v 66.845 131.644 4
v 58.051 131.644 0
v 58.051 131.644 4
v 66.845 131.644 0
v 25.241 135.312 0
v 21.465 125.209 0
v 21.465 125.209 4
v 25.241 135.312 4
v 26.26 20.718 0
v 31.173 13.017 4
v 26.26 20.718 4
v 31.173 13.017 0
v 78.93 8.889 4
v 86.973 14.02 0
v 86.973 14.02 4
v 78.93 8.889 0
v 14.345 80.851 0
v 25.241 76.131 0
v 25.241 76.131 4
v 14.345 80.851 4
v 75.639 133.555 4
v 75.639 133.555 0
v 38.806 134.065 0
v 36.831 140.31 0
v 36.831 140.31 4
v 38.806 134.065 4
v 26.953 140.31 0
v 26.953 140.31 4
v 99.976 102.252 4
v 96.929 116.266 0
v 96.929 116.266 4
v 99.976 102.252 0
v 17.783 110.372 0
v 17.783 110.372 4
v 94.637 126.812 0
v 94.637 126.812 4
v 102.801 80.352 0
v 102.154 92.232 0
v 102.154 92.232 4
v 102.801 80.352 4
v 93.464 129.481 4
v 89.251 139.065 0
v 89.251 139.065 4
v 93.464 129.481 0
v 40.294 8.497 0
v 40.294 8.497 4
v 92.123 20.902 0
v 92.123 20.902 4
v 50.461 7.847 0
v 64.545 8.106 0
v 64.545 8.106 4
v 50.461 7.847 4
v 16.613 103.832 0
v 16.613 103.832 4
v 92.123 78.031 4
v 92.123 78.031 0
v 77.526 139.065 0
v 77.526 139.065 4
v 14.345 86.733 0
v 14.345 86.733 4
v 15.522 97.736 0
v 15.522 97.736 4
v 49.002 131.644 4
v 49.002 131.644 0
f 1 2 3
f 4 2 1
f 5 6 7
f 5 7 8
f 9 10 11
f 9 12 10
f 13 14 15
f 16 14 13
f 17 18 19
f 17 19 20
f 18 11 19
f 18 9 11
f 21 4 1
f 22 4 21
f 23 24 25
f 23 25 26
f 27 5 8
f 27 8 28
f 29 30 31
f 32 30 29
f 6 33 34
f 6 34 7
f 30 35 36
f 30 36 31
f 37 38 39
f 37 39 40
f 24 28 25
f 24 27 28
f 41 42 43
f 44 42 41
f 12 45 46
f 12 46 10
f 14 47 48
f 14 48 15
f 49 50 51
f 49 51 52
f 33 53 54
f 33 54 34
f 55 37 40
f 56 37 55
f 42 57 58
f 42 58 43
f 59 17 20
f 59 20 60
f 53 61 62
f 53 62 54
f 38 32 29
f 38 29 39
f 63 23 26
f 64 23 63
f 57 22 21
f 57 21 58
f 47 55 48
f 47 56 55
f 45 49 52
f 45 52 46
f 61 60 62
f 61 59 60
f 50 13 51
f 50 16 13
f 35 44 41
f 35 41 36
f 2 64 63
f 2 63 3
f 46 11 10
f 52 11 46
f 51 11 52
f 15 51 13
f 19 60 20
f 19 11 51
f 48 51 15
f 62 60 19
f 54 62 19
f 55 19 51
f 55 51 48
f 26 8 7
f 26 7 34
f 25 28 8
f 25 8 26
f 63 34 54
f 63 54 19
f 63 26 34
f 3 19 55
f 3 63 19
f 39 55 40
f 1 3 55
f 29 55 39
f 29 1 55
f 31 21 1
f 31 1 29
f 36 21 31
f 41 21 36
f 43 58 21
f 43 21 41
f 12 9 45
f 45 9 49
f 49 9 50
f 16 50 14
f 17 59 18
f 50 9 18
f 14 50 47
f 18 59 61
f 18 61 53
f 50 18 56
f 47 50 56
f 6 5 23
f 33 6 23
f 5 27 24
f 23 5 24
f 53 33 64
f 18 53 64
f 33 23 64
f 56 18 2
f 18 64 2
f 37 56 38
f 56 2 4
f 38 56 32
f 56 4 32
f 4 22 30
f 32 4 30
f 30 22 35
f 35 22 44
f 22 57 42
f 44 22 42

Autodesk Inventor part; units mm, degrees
ref_plane "YZ Plane" through (0, 0, 0) normal (1, 0, 0) x (0, 1, 0)
ref_plane "XZ Plane" through (0, 0, 0) normal (0, 1, 0) x (-1, 0, 0)
ref_plane "XY Plane" through (0, 0, 0) normal (0, 0, 1) x (1, 0, 0)
sketch "Sketch1" plane through (0, 0, 0) normal (0, 0, 1) x (1, 0, 0)
  line L0 (26.9534, 140.31) -> (36.8306, 140.31)
  line L1 (36.8306, 140.31) -> (38.8061, 134.065)
  line L2 (38.8061, 134.065) -> (49.002, 131.6435)
  line L3 (49.002, 131.6435) -> (58.0509, 131.6435)
  line L4 (58.0509, 131.6435) -> (66.8448, 131.6435)
  line L5 (66.8448, 131.6435) -> (75.6388, 133.5552)
  line L6 (75.6388, 133.5552) -> (77.526, 139.065)
  line L7 (77.526, 139.065) -> (89.2513, 139.065)
  line L8 (89.2513, 139.065) -> (93.4636, 129.481)
  line L9 (93.4636, 129.481) -> (94.6369, 126.8115)
  line L10 (94.6369, 126.8115) -> (96.9293, 116.2664)
  line L11 (96.9293, 116.2664) -> (99.976, 102.2517)
  line L12 (99.976, 102.2517) -> (102.1542, 92.2318)
  line L13 (102.1542, 92.2318) -> (102.8007, 80.352)
  line L14 (102.8007, 80.352) -> (92.1232, 78.0307)
  line L15 (92.1232, 78.0307) -> (92.1232, 20.902)
  line L16 (92.1232, 20.902) -> (86.9727, 14.0196)
  line L17 (86.9727, 14.0196) -> (78.9304, 8.8886)
  line L18 (78.9304, 8.8886) -> (64.5453, 8.1057)
  line L19 (64.5453, 8.1057) -> (50.4611, 7.8467)
  line L20 (50.4611, 7.8467) -> (40.2944, 8.4971)
  line L21 (40.2944, 8.4971) -> (31.1734, 13.0172)
  line L22 (31.1734, 13.0172) -> (26.2605, 20.7176)
  line L23 (26.2605, 20.7176) -> (25.2413, 76.1313)
  line L24 (25.2413, 76.1313) -> (14.3454, 80.8506)
  line L25 (14.3454, 80.8506) -> (14.3454, 86.7328)
  line L26 (14.3454, 86.7328) -> (15.5218, 97.7359)
  line L27 (15.5218, 97.7359) -> (16.6126, 103.8324)
  line L28 (16.6126, 103.8324) -> (17.7826, 110.3719)
  line L29 (17.7826, 110.3719) -> (21.4653, 125.2093)
  line L30 (21.4653, 125.2093) -> (25.2413, 135.3116)
  line L31 (25.2413, 135.3116) -> (26.9534, 140.31)
  point P0 (0, 0)
extrude "Extrusion1" add sketch "Sketch1" along normal blind 4
